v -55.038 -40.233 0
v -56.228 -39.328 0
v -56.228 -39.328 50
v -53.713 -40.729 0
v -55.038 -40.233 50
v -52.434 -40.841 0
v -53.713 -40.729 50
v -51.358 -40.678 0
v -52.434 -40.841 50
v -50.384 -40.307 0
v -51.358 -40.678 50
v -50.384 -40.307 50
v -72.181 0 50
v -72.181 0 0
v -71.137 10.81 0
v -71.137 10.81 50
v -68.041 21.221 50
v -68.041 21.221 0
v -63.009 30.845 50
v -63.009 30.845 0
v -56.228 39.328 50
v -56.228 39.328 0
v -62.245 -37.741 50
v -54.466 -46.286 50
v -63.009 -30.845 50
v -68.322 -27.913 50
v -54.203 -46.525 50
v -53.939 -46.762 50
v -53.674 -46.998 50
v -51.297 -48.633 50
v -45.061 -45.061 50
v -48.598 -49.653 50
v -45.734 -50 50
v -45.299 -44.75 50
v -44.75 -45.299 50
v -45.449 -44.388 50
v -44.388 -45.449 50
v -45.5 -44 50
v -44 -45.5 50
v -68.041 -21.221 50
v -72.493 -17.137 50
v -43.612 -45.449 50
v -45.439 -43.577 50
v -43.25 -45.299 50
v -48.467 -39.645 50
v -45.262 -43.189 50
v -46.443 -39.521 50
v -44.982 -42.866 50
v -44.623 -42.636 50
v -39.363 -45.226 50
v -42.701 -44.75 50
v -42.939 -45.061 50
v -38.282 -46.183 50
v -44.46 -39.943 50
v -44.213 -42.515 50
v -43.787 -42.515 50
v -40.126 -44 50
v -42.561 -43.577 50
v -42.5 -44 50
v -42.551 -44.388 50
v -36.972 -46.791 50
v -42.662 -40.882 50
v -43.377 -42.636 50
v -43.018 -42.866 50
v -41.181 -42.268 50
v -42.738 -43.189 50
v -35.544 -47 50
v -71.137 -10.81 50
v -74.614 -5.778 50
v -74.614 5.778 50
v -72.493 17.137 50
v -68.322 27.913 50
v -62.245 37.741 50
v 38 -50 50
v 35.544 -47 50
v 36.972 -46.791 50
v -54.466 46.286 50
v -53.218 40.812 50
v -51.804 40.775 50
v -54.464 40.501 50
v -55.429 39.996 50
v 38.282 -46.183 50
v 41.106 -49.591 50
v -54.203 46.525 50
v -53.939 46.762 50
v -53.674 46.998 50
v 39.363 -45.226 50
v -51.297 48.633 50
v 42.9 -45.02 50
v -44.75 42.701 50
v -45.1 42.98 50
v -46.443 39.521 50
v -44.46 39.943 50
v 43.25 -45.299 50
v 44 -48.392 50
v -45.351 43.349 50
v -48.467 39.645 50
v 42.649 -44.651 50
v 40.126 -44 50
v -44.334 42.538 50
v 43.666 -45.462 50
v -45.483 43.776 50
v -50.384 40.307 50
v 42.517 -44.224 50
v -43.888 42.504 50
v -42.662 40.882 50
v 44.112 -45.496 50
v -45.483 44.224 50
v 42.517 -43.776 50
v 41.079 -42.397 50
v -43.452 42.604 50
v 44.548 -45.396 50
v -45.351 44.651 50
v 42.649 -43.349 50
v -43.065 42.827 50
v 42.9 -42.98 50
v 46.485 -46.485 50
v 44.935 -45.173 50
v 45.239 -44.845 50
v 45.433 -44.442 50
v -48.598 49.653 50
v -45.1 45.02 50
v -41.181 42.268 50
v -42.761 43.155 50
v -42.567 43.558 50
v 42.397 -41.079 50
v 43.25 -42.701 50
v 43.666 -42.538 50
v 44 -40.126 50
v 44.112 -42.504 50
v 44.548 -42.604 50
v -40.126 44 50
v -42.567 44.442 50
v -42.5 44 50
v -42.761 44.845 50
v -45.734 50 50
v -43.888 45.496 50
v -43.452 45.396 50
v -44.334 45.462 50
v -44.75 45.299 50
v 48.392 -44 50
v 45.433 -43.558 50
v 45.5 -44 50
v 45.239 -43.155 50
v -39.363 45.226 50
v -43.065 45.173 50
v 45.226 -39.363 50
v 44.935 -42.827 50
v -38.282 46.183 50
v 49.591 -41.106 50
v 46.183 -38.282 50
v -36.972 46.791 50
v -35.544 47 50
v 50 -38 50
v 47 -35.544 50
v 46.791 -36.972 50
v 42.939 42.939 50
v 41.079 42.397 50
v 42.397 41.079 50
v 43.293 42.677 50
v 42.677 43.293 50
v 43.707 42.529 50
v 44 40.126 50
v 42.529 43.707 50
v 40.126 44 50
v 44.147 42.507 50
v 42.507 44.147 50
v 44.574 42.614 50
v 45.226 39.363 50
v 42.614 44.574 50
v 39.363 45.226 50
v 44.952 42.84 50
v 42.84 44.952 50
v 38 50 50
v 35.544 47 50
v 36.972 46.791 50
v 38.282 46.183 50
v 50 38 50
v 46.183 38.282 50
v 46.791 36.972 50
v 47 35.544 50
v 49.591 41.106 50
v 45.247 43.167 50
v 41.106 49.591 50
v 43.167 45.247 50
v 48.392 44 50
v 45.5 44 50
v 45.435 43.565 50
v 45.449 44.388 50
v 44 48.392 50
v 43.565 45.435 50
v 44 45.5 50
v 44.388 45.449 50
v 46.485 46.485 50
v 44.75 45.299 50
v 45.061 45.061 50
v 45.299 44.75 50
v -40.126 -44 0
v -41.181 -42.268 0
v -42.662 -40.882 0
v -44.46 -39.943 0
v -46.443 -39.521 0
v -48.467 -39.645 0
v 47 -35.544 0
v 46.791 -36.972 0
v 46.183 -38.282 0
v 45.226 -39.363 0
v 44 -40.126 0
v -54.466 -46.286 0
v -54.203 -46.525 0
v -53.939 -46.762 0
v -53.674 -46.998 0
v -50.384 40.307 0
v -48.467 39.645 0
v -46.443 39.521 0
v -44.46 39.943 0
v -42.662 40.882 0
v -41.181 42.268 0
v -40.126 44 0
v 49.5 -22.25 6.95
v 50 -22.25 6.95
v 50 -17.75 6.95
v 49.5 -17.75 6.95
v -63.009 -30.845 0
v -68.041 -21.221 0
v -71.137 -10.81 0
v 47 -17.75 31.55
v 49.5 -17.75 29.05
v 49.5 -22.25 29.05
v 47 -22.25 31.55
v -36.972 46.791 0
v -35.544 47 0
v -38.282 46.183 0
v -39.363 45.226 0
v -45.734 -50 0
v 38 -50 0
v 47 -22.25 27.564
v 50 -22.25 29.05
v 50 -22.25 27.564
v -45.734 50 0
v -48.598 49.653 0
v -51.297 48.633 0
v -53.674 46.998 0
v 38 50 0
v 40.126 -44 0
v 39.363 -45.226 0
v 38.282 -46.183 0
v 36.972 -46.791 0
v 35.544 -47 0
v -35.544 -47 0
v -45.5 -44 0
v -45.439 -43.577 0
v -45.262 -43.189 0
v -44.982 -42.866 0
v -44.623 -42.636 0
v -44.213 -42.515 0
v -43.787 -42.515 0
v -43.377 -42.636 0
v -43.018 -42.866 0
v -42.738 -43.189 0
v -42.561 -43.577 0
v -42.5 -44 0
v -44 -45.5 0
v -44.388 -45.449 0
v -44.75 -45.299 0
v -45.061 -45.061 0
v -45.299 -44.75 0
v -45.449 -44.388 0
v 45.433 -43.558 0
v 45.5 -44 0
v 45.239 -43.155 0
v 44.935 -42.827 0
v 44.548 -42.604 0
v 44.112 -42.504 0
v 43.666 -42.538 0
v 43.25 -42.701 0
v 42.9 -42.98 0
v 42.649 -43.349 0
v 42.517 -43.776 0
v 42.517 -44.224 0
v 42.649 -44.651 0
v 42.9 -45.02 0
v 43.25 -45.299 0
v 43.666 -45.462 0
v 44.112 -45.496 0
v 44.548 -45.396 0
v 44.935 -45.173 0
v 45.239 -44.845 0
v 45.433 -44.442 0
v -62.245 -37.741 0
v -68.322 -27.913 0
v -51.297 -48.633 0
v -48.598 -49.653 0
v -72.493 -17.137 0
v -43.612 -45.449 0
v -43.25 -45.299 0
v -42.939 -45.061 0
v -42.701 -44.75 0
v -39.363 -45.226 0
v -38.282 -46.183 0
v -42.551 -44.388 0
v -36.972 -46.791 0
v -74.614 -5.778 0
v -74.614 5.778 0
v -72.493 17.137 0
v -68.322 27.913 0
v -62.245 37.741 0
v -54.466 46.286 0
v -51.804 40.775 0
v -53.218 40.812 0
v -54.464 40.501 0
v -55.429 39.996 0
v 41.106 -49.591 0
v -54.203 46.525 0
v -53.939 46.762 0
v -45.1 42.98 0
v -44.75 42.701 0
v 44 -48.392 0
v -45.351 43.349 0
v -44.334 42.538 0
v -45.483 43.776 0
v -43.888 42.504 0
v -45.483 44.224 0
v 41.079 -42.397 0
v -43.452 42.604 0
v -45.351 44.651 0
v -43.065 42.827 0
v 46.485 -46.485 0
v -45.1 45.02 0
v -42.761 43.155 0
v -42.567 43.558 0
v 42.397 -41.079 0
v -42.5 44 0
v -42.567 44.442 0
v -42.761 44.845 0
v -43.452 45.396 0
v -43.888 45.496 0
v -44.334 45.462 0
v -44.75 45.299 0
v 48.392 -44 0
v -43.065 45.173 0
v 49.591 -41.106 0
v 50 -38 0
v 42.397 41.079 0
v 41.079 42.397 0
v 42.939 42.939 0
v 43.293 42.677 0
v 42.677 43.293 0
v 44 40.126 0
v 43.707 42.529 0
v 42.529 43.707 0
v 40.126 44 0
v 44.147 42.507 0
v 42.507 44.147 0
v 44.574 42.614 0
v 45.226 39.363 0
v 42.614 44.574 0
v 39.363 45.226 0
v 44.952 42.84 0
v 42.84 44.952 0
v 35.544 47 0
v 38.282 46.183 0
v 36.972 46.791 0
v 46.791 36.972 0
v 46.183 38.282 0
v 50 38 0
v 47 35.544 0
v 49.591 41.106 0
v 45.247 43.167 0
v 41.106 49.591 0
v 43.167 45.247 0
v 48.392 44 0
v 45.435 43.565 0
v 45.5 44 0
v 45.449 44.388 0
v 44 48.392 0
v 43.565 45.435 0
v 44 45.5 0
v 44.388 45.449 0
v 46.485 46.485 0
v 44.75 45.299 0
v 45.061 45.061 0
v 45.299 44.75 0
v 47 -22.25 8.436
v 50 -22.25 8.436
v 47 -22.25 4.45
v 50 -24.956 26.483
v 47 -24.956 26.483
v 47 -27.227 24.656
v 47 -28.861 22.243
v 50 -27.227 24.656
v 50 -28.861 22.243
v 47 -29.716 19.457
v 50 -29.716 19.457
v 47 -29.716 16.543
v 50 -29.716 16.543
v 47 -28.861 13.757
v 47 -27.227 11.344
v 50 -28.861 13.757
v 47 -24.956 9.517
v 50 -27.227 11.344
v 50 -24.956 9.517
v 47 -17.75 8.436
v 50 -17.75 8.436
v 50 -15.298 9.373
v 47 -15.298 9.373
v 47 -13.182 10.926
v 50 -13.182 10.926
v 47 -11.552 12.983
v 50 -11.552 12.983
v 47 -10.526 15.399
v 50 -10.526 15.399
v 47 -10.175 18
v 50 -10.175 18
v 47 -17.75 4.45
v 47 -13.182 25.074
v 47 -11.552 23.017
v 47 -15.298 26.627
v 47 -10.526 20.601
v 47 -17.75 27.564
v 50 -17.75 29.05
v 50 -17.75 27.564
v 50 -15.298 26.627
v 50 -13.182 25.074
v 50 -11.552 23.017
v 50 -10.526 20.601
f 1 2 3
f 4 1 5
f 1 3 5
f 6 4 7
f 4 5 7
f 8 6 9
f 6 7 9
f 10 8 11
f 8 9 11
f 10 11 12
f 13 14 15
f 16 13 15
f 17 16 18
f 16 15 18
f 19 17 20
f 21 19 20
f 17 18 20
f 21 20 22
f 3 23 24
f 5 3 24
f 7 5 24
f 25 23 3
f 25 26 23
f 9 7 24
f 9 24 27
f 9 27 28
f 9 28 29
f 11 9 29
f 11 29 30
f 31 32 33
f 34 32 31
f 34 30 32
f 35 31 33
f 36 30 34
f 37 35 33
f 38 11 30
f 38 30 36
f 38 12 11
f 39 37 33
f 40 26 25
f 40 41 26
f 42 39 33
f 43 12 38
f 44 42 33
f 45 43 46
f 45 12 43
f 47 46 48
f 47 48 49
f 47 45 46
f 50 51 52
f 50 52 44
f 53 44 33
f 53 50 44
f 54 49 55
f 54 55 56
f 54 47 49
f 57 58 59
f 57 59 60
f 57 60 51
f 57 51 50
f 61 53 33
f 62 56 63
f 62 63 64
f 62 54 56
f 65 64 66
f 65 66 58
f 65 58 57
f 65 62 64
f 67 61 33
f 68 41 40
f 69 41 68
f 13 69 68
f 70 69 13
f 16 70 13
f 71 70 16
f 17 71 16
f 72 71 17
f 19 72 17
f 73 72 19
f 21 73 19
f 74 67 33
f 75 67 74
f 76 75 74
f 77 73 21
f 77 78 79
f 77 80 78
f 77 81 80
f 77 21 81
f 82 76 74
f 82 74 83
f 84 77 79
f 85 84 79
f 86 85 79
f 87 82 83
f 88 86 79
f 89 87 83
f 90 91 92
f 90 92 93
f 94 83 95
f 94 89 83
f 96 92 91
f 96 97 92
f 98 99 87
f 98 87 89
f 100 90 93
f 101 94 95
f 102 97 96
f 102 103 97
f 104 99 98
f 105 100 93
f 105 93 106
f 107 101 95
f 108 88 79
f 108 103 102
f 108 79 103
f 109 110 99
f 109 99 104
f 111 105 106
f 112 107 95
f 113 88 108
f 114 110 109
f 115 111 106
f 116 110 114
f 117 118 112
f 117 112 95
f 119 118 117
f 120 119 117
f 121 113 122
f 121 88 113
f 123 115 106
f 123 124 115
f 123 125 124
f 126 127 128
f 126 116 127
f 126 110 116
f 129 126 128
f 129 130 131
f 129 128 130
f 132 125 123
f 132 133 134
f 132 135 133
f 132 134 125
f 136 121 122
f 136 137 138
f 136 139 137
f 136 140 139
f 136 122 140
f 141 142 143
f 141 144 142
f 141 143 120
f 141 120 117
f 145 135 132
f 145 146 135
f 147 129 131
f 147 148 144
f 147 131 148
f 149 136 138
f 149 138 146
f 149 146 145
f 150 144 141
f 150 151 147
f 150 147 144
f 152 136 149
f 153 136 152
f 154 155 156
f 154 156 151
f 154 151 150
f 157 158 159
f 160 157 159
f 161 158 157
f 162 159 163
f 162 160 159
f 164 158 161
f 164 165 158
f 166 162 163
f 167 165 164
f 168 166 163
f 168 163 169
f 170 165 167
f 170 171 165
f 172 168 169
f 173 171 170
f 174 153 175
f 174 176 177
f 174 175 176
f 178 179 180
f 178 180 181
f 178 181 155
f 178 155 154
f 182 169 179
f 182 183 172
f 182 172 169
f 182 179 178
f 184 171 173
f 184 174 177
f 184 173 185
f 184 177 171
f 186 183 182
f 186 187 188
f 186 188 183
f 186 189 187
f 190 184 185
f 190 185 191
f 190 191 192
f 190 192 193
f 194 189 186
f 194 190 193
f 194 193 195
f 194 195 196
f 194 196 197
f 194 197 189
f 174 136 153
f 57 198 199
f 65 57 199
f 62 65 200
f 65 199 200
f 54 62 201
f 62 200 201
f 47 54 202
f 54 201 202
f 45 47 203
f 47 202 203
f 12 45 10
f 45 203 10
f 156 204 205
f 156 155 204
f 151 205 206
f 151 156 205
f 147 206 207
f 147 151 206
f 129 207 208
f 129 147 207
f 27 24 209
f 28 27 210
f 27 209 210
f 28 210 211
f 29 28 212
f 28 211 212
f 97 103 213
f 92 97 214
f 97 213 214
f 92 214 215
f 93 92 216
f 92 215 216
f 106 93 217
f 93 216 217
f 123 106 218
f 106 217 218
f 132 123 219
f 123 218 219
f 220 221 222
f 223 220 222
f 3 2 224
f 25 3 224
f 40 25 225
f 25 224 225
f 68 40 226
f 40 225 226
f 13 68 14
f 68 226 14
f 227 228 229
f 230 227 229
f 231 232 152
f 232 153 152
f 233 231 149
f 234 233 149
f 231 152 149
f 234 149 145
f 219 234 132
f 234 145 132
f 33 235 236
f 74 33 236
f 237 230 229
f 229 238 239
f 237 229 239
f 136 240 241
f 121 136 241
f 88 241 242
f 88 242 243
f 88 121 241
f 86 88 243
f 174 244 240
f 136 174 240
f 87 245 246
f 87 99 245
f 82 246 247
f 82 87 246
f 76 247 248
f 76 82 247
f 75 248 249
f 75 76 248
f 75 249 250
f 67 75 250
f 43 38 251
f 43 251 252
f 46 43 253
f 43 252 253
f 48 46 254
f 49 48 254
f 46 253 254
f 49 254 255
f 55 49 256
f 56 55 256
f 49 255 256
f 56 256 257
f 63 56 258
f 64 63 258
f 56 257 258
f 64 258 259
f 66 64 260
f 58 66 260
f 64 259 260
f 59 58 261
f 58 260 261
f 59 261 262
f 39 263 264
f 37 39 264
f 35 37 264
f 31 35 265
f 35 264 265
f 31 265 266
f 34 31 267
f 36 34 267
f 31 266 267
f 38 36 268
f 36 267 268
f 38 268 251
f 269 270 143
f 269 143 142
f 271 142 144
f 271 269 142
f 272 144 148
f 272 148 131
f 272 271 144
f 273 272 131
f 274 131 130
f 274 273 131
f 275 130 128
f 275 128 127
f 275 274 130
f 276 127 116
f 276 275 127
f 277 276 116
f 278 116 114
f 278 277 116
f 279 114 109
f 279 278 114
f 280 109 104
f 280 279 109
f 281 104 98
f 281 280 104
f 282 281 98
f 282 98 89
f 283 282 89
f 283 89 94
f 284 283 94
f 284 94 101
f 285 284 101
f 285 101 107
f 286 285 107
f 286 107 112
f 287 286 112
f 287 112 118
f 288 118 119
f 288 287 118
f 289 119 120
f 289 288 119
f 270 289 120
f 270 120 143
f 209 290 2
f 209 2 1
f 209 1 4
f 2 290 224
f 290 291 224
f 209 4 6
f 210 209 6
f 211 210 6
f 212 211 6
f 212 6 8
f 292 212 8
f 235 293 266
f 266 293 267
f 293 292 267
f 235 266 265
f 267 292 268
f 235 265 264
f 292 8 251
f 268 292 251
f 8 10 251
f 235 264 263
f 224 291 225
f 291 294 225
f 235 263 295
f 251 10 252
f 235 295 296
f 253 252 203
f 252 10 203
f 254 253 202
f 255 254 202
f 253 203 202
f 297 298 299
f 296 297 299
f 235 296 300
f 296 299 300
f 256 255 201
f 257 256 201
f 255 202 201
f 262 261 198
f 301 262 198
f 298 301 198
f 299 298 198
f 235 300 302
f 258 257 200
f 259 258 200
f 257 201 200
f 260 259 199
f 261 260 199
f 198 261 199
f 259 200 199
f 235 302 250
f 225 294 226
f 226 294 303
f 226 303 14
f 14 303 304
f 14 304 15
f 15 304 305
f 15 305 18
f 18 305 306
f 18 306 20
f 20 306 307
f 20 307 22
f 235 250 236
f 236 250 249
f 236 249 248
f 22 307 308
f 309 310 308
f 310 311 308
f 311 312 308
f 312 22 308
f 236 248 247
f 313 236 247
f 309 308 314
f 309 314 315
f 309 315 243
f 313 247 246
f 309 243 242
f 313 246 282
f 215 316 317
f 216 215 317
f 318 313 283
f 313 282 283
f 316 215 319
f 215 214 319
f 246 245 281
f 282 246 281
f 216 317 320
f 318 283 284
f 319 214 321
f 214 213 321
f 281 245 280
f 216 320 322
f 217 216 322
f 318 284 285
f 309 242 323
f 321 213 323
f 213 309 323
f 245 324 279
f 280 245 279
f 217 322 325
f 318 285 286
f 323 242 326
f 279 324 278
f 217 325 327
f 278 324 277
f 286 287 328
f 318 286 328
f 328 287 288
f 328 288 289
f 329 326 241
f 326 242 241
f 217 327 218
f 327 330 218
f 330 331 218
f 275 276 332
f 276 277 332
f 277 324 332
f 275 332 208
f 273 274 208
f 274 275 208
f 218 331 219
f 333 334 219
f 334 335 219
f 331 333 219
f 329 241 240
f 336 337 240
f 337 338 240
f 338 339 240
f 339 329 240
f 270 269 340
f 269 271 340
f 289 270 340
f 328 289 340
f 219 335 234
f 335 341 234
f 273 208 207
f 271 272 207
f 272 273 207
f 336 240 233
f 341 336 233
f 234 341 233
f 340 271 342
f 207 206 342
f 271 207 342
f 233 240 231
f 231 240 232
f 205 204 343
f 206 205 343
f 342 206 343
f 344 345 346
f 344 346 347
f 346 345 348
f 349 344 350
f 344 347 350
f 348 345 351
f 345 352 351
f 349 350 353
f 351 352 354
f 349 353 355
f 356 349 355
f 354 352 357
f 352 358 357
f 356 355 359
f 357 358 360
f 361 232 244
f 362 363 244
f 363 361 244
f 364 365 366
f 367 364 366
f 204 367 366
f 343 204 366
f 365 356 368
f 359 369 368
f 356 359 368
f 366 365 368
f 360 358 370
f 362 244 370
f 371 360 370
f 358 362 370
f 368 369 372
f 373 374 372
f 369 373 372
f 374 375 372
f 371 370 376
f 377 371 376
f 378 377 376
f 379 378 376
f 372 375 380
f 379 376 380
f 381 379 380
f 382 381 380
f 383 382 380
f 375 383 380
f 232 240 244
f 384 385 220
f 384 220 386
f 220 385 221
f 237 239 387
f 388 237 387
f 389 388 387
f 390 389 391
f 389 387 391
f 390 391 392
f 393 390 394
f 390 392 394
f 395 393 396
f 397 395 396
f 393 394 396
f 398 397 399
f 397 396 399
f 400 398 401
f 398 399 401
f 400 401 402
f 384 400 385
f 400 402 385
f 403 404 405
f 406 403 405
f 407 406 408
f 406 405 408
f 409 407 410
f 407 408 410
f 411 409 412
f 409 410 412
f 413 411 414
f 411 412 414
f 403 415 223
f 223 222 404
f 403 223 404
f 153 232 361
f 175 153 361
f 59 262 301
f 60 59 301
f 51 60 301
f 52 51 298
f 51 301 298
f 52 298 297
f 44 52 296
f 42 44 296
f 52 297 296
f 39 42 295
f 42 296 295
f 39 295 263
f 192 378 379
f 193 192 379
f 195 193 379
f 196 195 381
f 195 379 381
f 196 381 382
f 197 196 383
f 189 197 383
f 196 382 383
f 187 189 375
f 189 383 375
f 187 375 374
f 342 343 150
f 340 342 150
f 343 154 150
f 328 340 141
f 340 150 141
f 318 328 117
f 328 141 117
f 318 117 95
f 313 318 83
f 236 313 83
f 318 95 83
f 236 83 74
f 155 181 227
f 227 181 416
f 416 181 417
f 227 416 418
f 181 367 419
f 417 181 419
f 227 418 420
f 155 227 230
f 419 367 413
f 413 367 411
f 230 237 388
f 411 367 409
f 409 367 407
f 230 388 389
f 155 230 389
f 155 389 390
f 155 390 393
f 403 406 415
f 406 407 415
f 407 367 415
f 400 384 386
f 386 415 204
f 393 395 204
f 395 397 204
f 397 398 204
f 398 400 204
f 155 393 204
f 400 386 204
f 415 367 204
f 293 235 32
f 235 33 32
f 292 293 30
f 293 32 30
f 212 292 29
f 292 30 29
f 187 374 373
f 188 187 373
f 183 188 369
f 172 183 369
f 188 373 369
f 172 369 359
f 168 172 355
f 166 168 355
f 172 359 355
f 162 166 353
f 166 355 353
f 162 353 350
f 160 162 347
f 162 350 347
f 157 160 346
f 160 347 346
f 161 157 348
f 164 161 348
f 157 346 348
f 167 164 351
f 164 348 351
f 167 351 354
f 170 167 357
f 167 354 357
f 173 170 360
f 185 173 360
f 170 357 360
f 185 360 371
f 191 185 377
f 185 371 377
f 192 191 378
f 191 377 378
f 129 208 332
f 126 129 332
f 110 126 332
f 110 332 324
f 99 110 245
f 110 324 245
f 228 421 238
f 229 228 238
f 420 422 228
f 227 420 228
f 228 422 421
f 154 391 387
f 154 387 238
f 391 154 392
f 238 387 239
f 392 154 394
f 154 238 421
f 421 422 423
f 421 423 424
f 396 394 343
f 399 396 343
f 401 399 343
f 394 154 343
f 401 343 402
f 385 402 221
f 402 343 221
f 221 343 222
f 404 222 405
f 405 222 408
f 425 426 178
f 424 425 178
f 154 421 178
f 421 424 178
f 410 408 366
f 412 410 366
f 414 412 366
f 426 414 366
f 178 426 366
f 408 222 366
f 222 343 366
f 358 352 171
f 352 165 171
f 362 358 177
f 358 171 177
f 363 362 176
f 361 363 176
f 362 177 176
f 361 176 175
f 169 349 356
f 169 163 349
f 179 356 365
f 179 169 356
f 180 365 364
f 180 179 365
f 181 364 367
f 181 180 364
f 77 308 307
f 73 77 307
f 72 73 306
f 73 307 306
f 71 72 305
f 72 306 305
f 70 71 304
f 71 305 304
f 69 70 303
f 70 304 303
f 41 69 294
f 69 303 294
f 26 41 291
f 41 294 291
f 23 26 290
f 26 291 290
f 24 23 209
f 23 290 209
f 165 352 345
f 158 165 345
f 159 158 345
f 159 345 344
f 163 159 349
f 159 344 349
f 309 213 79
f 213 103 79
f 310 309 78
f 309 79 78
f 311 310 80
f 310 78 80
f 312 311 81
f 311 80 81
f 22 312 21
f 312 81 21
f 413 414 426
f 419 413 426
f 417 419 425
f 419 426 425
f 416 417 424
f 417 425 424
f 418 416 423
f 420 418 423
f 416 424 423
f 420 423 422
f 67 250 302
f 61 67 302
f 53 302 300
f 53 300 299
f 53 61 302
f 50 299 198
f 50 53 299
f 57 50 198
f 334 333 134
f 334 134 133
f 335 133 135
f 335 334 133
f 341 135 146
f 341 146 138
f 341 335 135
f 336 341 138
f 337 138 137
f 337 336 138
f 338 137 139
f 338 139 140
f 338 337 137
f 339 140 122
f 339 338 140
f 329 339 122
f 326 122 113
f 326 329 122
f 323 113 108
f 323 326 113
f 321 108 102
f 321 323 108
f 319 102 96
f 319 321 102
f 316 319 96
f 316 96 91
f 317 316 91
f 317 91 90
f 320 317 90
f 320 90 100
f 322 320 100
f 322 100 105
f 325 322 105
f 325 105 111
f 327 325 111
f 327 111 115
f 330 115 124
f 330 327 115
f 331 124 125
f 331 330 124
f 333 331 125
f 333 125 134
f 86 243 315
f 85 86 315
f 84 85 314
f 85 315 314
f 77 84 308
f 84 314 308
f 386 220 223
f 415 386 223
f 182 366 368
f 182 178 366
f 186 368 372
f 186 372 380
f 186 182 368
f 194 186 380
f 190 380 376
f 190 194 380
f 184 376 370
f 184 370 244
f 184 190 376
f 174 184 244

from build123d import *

# Parameters (mm, degrees)
F0_R     = 1.5
F1_DEPTH = 50
F2_R     = 12
F3_R     = 5
F5_DEPTH = 4
F6_SIZE  = 2.5


with BuildPart() as f1:
    # F0 (on Top) → F1 (new body)
    with BuildSketch(Plane.XY):
        with BuildLine():
            Line((40.1261364576, -50), (50, -50))
            Line((50, -50), (50, -40.1261364576))
            ThreePointArc((50, -40.1261364576), (48.5323223277, -39.658202653), (47, -39.5))
            Line((47, -39.5), (47, -47))
            Line((47, -47), (39.5, -47))
            ThreePointArc((39.5, -47), (39.658202653, -48.5323223277), (40.1261364576, -50))
        make_face()
        with BuildLine():
            Line((-40.1261364576, -50), (40.1261364576, -50))
            ThreePointArc((40.1261364576, -50), (39.658202653, -48.5323223277), (39.5, -47))
            Line((39.5, -47), (-39.5, -47))
            ThreePointArc((-39.5, -47), (-39.658202653, -48.5323223277), (-40.1261364576, -50))
        make_face()
        with BuildLine():
            ThreePointArc((47, -39.5), (48.5323223277, -39.658202653), (50, -40.1261364576))
            Line((50, -40.1261364576), (50, 40.1261364576))
            ThreePointArc((50, 40.1261364576), (48.5323223277, 39.658202653), (47, 39.5))
            Line((47, 39.5), (47, -39.5))
        make_face()
        with BuildLine():
            Line((-50, -50), (-40.1261364576, -50))
            ThreePointArc((-40.1261364576, -50), (-39.658202653, -48.5323223277), (-39.5, -47))
            Line((-39.5, -47), (-44, -47))
            Line((-44, -47), (-47, -47))
            ThreePointArc((-47, -47), (-50.0530276117, -44.8189291928), (-52.9544285232, -42.4398705103))
            ThreePointArc((-52.9544285232, -42.4398705103), (-53.9803824114, -44.2569612852), (-54.4659740059, -46.2863949669))
            ThreePointArc((-54.4659740059, -46.2863949669), (-52.2760251532, -48.1949550771), (-50, -50))
        make_face()
        with BuildLine():
            ThreePointArc((47, -39.5), (41.6966991411, -41.6966991411), (39.5, -47))
            Line((39.5, -47), (47, -47))
            Line((47, -47), (47, -39.5))
        make_face()
        with Locations((44, -44)):
            Circle(F0_R, mode=Mode.SUBTRACT)
        with BuildLine():
            ThreePointArc((47, 39.5), (48.5323223277, 39.658202653), (50, 40.1261364576))
            Line((50, 40.1261364576), (50, 50))
            Line((50, 50), (40.1261364576, 50))
            ThreePointArc((40.1261364576, 50), (39.658202653, 48.5323223277), (39.5, 47))
            Line((39.5, 47), (44, 47))
            Line((44, 47), (47, 47))
            Line((47, 47), (47, 44))
            Line((47, 44), (47, 39.5))
        make_face()
        with BuildLine():
            ThreePointArc((-54.4659740059, 46.2863949669), (-74.8805891399, 0), (-54.4659740059, -46.2863949669))
            ThreePointArc((-54.4659740059, -46.2863949669), (-53.9803824114, -44.2569612852), (-52.9544285232, -42.4398705103))
            ThreePointArc((-52.9544285232, -42.4398705103), (-67.1504896249, -23.2960258249), (-72.1814061329, 0))
            ThreePointArc((-72.1814061329, 0), (-67.1504896249, 23.2960258249), (-52.9544285232, 42.4398705103))
            ThreePointArc((-52.9544285232, 42.4398705103), (-53.9803824114, 44.2569612852), (-54.4659740059, 46.2863949669))
        make_face()
        with BuildLine():
            Line((-44, -47), (-39.5, -47))
            ThreePointArc((-39.5, -47), (-44.5925338968, -39.8968945551), (-52.9544285232, -42.4398705103))
            ThreePointArc((-52.9544285232, -42.4398705103), (-50.0530276117, -44.8189291928), (-47, -47))
            Line((-47, -47), (-44, -47))
        make_face()
        with BuildLine():
            ThreePointArc((-42.5, -44), (-42.9393398282, -45.0606601718), (-44, -45.5))
            ThreePointArc((-44, -45.5), (-45.0606601718, -45.0606601718), (-45.5, -44))
            ThreePointArc((-45.5, -44), (-44, -42.5), (-42.5, -44))
        make_face(mode=Mode.SUBTRACT)
        with BuildLine():
            ThreePointArc((39.5, 47), (41.6966991411, 41.6966991411), (47, 39.5))
            Line((47, 39.5), (47, 44))
            Line((47, 44), (45.5, 44))
            ThreePointArc((45.5, 44), (42.9393398282, 42.9393398282), (44, 45.5))
            Line((44, 45.5), (44, 47))
            Line((44, 47), (39.5, 47))
        make_face()
        with BuildLine():
            ThreePointArc((-50, 50), (-52.2760251532, 48.1949550771), (-54.4659740059, 46.2863949669))
            ThreePointArc((-54.4659740059, 46.2863949669), (-53.9803824114, 44.2569612852), (-52.9544285232, 42.4398705103))
            ThreePointArc((-52.9544285232, 42.4398705103), (-50.0530276117, 44.8189291928), (-47, 47))
            Line((-47, 47), (-39.5, 47))
            ThreePointArc((-39.5, 47), (-39.658202653, 48.5323223277), (-40.1261364576, 50))
            Line((-40.1261364576, 50), (-50, 50))
        make_face()
        with BuildLine():
            ThreePointArc((39.5, 47), (39.658202653, 48.5323223277), (40.1261364576, 50))
            Line((40.1261364576, 50), (-40.1261364576, 50))
            ThreePointArc((-40.1261364576, 50), (-39.658202653, 48.5323223277), (-39.5, 47))
            Line((-39.5, 47), (39.5, 47))
        make_face()
        with BuildLine():
            Line((45.5, 44), (47, 44))
            Line((47, 44), (47, 47))
            Line((47, 47), (44, 47))
            Line((44, 47), (44, 45.5))
            ThreePointArc((44, 45.5), (45.0606601718, 45.0606601718), (45.5, 44))
        make_face()
        with BuildLine():
            ThreePointArc((-47, 47), (-50.0530276117, 44.8189291928), (-52.9544285232, 42.4398705103))
            ThreePointArc((-52.9544285232, 42.4398705103), (-44.5925338968, 39.8968945551), (-39.5, 47))
            Line((-39.5, 47), (-47, 47))
        make_face()
        with Locations((-44, 44)):
            Circle(F0_R, mode=Mode.SUBTRACT)
    extrude(amount=F1_DEPTH)

    # F2
    f2_edges = [f1.edges().sort_by_distance(p)[0] for p in [
        (-50, 50, 25),
        (50, 50, 25),
        (50, -50, 25),
        (-50, -50, 25),
    ]]
    fillet(f2_edges, radius=F2_R)

    # F3
    f3_edges = [f1.edges().sort_by_distance(p)[0] for p in [
        (-39.5, -47, 25),
        (39.5, -47, 25),
        (47, -39.5, 25),
        (39.5, 47, 25),
        (47, 39.5, 25),
        (-39.5, 47, 25),
        (-52.954429, -42.439871, 25),
        (-52.954429, 42.439871, 25),
    ]]
    fillet(f3_edges, radius=F3_R)

    # F4 (on face) → F5 (cut)
    with BuildSketch(Plane.YZ.offset(50)):
        with BuildLine():
            Line((-22.25, 8.4361030432), (-22.25, 27.5638969568))
            ThreePointArc((-22.25, 27.5638969568), (-29.825, 18), (-22.25, 8.4361030432))
        make_face()
        with BuildLine():
            Line((-17.75, 8.4361030432), (-17.75, 27.5638969568))
            ThreePointArc((-17.75, 27.5638969568), (-20, 27.825), (-22.25, 27.5638969568))
            Line((-22.25, 27.5638969568), (-22.25, 8.4361030432))
            ThreePointArc((-22.25, 8.4361030432), (-20, 8.175), (-17.75, 8.4361030432))
        make_face()
        with BuildLine():
            ThreePointArc((-17.75, 8.4361030432), (-12.2981536305, 11.8998206994), (-10.175, 18))
            ThreePointArc((-10.175, 18), (-12.2981536305, 24.1001793006), (-17.75, 27.5638969568))
            Line((-17.75, 27.5638969568), (-17.75, 8.4361030432))
        make_face()
        with BuildLine():
            ThreePointArc((-22.25, 27.5638969568), (-20, 27.825), (-17.75, 27.5638969568))
            Line((-17.75, 27.5638969568), (-17.75, 29.05))
            Line((-17.75, 29.05), (-22.25, 29.05))
            Line((-22.25, 29.05), (-22.25, 27.5638969568))
        make_face()
        with BuildLine():
            Line((-17.75, 6.95), (-17.75, 8.4361030432))
            ThreePointArc((-17.75, 8.4361030432), (-20, 8.175), (-22.25, 8.4361030432))
            Line((-22.25, 8.4361030432), (-22.25, 6.95))
            Line((-22.25, 6.95), (-17.75, 6.95))
        make_face()
    extrude(amount=-F5_DEPTH, mode=Mode.SUBTRACT)

    # F6
    f6_edges = [f1.edges().sort_by_distance(p)[0] for p in [
        (47, -20, 29.05),
        (47, -20, 6.95),
    ]]
    chamfer(f6_edges, length=F6_SIZE)


solid = f1.part
